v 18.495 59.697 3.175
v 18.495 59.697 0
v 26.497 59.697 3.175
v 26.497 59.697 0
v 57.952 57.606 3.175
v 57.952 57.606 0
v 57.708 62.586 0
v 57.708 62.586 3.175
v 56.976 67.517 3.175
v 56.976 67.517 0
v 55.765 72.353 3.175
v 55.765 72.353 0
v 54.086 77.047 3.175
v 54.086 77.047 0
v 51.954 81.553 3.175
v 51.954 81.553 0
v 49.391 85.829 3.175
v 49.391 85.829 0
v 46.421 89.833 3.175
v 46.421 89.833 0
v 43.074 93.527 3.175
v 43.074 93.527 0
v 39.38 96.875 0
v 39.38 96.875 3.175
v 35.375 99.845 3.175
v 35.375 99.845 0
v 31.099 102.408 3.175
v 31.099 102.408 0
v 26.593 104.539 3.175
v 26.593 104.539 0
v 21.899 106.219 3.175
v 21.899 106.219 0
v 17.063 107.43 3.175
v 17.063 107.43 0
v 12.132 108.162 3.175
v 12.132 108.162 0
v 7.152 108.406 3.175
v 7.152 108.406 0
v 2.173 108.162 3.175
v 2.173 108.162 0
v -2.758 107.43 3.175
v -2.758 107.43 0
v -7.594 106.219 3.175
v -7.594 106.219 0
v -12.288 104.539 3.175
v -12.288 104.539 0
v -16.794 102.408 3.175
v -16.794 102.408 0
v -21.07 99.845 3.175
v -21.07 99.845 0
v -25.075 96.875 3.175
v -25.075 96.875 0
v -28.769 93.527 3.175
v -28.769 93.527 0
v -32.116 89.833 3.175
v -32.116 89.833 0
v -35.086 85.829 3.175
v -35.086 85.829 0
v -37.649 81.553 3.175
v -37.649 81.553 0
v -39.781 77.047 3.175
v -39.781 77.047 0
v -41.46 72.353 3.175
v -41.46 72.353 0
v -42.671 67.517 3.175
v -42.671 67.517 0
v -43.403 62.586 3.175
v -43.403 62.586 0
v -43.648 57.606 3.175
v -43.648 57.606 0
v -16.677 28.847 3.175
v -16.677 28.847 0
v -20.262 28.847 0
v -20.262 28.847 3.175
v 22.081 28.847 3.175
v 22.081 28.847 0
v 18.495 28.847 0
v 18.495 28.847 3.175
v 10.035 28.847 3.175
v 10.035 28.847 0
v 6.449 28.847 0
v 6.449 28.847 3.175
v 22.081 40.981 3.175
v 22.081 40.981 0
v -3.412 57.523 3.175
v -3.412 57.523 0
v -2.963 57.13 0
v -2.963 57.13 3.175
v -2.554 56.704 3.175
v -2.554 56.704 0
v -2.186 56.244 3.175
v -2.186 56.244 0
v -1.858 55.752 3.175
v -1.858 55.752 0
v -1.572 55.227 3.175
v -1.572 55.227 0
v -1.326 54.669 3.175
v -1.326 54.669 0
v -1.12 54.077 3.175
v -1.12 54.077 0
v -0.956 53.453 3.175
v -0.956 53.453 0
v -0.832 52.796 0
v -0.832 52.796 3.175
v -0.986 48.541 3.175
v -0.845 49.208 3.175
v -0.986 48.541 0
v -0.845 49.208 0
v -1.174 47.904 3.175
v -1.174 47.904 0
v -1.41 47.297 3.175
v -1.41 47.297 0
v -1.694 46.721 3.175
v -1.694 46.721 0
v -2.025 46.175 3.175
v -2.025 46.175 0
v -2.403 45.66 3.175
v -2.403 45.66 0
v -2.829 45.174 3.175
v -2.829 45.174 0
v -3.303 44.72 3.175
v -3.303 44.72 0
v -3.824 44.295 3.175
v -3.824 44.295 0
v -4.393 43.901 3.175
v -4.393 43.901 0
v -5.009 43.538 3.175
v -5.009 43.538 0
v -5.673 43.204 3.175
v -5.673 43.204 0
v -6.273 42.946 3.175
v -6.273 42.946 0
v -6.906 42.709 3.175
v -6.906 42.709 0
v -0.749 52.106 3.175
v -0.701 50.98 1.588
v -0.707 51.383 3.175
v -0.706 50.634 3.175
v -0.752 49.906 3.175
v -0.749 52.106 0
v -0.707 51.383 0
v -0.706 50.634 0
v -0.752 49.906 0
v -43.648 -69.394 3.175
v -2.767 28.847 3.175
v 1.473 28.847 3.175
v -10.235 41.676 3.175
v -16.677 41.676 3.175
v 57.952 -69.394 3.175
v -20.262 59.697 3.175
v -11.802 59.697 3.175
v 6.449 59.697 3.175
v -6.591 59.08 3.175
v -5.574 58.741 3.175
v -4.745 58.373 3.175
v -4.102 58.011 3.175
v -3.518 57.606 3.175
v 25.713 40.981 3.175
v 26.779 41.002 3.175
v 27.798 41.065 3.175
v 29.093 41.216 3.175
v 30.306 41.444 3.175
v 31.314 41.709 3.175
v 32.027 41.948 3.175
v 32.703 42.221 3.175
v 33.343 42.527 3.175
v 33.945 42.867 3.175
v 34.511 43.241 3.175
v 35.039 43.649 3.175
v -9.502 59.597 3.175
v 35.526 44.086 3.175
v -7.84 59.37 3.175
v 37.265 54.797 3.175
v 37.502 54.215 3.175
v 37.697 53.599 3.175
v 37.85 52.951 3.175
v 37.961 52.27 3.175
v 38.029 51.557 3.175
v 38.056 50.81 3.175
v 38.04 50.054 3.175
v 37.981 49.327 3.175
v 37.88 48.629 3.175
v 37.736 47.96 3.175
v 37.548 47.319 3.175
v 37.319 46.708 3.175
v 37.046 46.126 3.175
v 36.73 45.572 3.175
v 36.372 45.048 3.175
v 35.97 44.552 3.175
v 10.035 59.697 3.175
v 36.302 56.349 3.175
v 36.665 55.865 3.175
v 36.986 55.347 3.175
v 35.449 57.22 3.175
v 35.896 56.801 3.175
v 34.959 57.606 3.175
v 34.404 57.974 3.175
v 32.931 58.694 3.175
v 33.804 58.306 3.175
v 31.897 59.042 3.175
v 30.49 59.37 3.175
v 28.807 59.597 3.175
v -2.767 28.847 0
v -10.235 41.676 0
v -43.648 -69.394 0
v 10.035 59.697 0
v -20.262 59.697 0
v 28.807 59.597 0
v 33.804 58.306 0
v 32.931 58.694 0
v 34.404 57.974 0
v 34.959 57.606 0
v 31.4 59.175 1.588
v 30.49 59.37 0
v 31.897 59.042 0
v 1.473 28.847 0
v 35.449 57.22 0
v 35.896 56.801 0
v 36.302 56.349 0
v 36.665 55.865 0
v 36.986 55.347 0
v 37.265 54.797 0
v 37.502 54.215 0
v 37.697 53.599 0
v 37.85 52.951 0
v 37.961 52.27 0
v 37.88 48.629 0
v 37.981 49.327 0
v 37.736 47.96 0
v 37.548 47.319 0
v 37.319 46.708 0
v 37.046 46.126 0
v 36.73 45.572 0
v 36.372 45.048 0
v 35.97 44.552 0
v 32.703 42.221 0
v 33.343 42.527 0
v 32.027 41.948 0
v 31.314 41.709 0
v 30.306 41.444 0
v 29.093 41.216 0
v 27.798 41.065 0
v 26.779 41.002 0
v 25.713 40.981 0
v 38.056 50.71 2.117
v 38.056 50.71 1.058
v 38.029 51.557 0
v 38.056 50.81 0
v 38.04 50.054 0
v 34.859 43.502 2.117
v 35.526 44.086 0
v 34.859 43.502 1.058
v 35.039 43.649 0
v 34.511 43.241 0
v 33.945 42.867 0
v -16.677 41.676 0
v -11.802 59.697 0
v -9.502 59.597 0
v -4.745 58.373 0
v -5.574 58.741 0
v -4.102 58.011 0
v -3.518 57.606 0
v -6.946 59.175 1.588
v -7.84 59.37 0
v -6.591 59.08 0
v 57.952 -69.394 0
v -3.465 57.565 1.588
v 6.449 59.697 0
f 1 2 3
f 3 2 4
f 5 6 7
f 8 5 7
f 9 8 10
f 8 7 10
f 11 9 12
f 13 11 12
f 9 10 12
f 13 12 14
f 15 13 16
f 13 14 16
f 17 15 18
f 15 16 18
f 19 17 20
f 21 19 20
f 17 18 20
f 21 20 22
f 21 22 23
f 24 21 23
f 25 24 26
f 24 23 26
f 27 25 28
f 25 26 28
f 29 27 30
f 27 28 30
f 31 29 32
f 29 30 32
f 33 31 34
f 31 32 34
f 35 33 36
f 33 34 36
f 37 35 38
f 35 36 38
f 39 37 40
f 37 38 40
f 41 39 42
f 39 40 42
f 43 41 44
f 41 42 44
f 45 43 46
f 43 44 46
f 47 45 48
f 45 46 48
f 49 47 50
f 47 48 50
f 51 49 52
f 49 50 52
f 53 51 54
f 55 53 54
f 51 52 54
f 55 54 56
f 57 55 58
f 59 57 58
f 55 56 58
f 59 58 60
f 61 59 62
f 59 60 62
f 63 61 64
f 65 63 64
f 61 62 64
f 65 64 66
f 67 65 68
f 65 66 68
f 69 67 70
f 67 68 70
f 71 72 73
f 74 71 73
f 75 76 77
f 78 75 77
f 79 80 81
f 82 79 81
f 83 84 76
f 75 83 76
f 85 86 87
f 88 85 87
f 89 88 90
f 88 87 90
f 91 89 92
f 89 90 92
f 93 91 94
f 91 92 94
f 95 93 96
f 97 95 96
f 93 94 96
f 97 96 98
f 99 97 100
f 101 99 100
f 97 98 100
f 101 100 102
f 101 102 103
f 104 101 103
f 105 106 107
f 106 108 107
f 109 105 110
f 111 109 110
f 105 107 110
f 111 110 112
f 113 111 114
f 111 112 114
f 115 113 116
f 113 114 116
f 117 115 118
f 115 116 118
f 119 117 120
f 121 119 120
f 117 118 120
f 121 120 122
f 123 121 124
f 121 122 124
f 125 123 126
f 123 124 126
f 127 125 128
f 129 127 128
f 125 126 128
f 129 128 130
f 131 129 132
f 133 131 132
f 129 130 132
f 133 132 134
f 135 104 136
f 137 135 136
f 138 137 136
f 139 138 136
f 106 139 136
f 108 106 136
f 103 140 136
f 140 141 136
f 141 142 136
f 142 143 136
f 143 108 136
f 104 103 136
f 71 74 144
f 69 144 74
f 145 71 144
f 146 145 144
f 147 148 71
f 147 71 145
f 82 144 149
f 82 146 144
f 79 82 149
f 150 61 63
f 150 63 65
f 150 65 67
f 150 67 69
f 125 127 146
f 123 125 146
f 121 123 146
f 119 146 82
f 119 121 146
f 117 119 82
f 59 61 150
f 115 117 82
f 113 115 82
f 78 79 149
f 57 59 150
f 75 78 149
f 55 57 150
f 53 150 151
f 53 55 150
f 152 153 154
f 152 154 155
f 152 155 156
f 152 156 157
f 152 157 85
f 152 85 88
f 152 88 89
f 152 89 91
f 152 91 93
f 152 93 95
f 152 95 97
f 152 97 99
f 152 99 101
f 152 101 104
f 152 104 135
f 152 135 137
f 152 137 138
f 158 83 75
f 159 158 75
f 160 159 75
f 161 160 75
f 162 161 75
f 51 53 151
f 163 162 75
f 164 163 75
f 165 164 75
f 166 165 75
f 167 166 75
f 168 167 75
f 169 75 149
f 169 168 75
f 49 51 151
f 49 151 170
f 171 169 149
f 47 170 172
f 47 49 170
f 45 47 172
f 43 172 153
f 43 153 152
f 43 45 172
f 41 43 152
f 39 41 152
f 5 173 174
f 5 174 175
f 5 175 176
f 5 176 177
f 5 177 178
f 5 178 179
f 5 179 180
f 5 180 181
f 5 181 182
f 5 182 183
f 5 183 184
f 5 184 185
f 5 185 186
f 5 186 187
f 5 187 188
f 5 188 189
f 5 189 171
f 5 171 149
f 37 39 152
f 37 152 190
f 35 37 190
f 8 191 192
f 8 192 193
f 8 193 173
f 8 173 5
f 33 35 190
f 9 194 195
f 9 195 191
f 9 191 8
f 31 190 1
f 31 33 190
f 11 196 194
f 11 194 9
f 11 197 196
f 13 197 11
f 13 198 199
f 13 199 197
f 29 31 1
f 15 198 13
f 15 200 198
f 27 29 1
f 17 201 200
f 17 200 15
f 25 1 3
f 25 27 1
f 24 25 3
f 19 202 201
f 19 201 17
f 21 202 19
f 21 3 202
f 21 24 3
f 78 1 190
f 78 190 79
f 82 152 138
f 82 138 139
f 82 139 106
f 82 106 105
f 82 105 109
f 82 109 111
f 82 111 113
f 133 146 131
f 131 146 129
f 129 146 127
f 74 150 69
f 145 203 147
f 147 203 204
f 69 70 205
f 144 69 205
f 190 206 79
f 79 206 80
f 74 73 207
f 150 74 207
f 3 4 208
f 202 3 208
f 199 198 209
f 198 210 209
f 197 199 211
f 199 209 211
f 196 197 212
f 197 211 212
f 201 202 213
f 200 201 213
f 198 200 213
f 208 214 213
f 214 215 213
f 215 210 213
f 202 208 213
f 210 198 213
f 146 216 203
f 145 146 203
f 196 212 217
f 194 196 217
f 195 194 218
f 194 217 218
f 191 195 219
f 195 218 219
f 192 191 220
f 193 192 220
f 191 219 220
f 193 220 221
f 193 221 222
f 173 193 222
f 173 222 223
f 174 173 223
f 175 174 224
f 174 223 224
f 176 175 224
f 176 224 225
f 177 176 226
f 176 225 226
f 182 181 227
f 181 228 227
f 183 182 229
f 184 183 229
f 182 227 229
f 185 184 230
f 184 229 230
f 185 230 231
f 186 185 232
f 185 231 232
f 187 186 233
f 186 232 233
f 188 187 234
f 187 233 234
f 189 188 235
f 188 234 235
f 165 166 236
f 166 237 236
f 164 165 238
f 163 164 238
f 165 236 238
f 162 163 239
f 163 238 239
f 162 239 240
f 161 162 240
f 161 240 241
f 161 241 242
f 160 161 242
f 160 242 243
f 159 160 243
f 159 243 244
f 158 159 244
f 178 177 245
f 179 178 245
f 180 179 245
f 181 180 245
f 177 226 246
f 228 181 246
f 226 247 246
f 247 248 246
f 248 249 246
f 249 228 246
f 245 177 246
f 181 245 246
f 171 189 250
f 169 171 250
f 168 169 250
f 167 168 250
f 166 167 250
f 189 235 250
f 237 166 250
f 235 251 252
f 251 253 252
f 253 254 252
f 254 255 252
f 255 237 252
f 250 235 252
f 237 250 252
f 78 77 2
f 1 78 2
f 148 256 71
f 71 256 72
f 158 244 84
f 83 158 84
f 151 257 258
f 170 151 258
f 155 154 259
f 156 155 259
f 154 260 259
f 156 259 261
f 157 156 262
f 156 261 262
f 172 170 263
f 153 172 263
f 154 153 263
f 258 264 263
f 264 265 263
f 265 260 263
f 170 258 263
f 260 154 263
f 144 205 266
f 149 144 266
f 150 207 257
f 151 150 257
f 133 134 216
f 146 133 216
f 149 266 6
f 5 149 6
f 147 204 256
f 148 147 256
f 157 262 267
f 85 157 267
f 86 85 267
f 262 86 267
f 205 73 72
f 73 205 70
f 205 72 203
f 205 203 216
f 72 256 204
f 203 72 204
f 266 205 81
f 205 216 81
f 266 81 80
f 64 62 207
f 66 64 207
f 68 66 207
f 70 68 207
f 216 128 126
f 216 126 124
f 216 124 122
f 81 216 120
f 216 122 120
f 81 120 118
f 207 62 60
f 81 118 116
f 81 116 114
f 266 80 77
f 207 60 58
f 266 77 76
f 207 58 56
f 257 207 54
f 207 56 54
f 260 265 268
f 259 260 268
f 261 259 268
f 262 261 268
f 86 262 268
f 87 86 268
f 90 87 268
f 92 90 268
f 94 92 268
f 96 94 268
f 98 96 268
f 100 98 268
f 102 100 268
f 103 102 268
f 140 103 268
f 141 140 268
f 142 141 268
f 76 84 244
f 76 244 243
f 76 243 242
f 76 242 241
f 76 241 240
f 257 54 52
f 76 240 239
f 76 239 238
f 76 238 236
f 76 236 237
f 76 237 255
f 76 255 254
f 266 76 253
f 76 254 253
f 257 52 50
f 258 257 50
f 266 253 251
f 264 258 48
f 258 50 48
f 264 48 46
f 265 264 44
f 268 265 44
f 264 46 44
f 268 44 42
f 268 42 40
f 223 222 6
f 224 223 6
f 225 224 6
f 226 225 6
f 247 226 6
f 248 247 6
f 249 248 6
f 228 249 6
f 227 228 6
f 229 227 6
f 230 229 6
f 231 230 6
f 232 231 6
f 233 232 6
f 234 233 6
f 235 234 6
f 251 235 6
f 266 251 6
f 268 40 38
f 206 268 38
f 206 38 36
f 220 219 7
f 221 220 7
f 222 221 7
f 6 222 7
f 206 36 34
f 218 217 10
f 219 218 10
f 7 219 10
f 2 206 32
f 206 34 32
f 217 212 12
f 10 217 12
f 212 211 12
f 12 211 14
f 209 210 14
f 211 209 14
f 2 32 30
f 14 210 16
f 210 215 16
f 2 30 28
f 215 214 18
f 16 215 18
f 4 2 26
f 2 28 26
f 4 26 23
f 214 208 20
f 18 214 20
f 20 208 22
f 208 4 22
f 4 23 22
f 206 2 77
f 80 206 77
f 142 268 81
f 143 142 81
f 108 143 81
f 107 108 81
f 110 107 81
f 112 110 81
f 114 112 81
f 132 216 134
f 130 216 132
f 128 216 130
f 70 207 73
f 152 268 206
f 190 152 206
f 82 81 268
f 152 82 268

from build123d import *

# Parameters (mm, degrees)
F1_DEPTH = 3.175


with BuildPart() as f1:
    # F0 (on Top) → F1 (new body)
    with BuildSketch(Plane.XY):
        with BuildLine():
            Line((-43.6475083196, 57.6062907483), (-43.6475083196, -69.3937092517))
            Line((-43.6475083196, -69.3937092517), (57.9524916804, -69.3937092517))
            Line((57.9524916804, -69.3937092517), (57.9524916804, 57.6062907483))
            Line((57.9524916804, 57.6062907483), (34.9589943423, 57.6062907483))
            add(Edge.make_bspline(
                [(34.9589943423, 57.6062907483), (38.056212694, 55.3623037103), (38.056212694, 50.7103741337)],
                knots=[0.4823776889, 0.4823776889, 0.4823776889, 1, 1, 1], degree=2))
            add(Edge.make_bspline(
                [(38.056212694, 50.7103741337), (38.056212694, 46.0243819592), (34.8590696182, 43.5024538941)],
                knots=[0, 0, 0, 1, 1, 1], degree=2))
            add(Edge.make_bspline(
                [(34.8590696182, 43.5024538941), (31.6619265424, 40.980525829), (25.7132822978, 40.980525829)],
                knots=[0, 0, 0, 1, 1, 1], degree=2))
            Line((25.7132822978, 40.980525829), (22.08062554, 40.980525829))
            Line((22.08062554, 40.980525829), (22.08062554, 28.846912086))
            Line((22.08062554, 28.846912086), (18.495233833, 28.846912086))
            Line((18.495233833, 28.846912086), (18.495233833, 57.6062907483))
            Line((18.495233833, 57.6062907483), (10.0347897484, 57.6062907483))
            Line((10.0347897484, 57.6062907483), (10.0347897484, 28.846912086))
            Line((10.0347897484, 28.846912086), (6.4493980414, 28.846912086))
            Line((6.4493980414, 28.846912086), (6.4493980414, 57.6062907483))
            Line((6.4493980414, 57.6062907483), (-3.5177150874, 57.6062907483))
            add(Edge.make_bspline(
                [(-3.5177150874, 57.6062907483), (-3.4643650115, 57.5651959541), (-3.4121171904, 57.5232935921)],
                knots=[0.9807273895, 0.9807273895, 0.9807273895, 1, 1, 1], degree=2))
            add(Edge.make_bspline(
                [(-3.4121171904, 57.5232935921), (-0.7011289223, 55.3491012575), (-0.7011289223, 50.980460138)],
                knots=[0, 0, 0, 1, 1, 1], degree=2))
            add(Edge.make_bspline(
                [(-0.7011289223, 50.980460138), (-0.7011289223, 44.8630121407), (-6.906354871, 42.7090762565)],
                knots=[0, 0, 0, 1, 1, 1], degree=2))
            Line((-6.906354871, 42.7090762565), (1.4730634123, 28.846912086))
            Line((1.4730634123, 28.846912086), (-2.7672868552, 28.846912086))
            Line((-2.7672868552, 28.846912086), (-10.2351648739, 41.67599729))
            Line((-10.2351648739, 41.67599729), (-16.6767160764, 41.67599729))
            Line((-16.6767160764, 41.67599729), (-16.6767160764, 28.846912086))
            Line((-16.6767160764, 28.846912086), (-20.2621077834, 28.846912086))
            Line((-20.2621077834, 28.846912086), (-20.2621077834, 57.6062907483))
            Line((-20.2621077834, 57.6062907483), (-43.6475083196, 57.6062907483))
        make_face()
        with BuildLine():
            ThreePointArc((57.9524916804, 57.6062907483), (7.1524916804, 108.4062907483), (-43.6475083196, 57.6062907483))
            Line((-43.6475083196, 57.6062907483), (-20.2621077834, 57.6062907483))
            Line((-20.2621077834, 57.6062907483), (-20.2621077834, 59.6974859266))
            Line((-20.2621077834, 59.6974859266), (-11.8016636989, 59.6974859266))
            add(Edge.make_bspline(
                [(-11.8016636989, 59.6974859266), (-6.2325460998, 59.6974859266), (-3.5177150874, 57.6062907483)],
                knots=[0, 0, 0, 0.9807273895, 0.9807273895, 0.9807273895], degree=2))
            Line((-3.5177150874, 57.6062907483), (6.4493980414, 57.6062907483))
            Line((6.4493980414, 57.6062907483), (6.4493980414, 59.6974859266))
            Line((6.4493980414, 59.6974859266), (10.0347897484, 59.6974859266))
            Line((10.0347897484, 59.6974859266), (10.0347897484, 57.6062907483))
            Line((10.0347897484, 57.6062907483), (18.495233833, 57.6062907483))
            Line((18.495233833, 57.6062907483), (18.495233833, 59.6974859266))
            Line((18.495233833, 59.6974859266), (26.4965317102, 59.6974859266))
            add(Edge.make_bspline(
                [(26.4965317102, 59.6974859266), (32.0726639073, 59.6974859266), (34.9589943423, 57.6062907483)],
                knots=[0, 0, 0, 0.4823776889, 0.4823776889, 0.4823776889], degree=2))
            Line((34.9589943423, 57.6062907483), (57.9524916804, 57.6062907483))
        make_face()
    extrude(amount=F1_DEPTH)


solid = f1.part
